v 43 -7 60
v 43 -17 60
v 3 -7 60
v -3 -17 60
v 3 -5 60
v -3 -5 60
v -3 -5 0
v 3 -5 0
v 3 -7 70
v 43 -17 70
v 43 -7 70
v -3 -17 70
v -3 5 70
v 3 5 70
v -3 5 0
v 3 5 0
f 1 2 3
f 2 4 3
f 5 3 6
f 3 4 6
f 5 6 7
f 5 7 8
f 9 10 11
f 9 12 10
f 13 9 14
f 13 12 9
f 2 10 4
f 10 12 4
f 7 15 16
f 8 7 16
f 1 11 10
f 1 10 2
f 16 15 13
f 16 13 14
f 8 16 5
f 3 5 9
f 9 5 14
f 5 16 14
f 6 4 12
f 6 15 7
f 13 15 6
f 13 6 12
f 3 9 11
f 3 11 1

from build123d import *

# Parameters (mm, degrees)
SKETCH1_W           = 6
SKETCH1_H           = 10
BOSS_EXTRUDE1_DEPTH = 70
SKETCH2_W           = 6
SKETCH2_H           = 10
BOSS_EXTRUDE2_DEPTH = 12
SKETCH3_W           = 10
SKETCH3_H           = 10
BOSS_EXTRUDE3_DEPTH = 40


with BuildPart() as part:
    # Sketch1 → Boss-Extrude1 (new body)
    with BuildSketch(Plane.XY):
        Rectangle(SKETCH1_W, SKETCH1_H)
    extrude(amount=BOSS_EXTRUDE1_DEPTH)

    # Sketch2 → Boss-Extrude2 (add)
    with BuildSketch(Plane.XZ.offset(5)):
        with Locations((0, 65)):
            Rectangle(SKETCH2_W, SKETCH2_H)
    extrude(amount=BOSS_EXTRUDE2_DEPTH)

    # Sketch3 → Boss-Extrude3 (add)
    with BuildSketch(Plane(origin=(3, 0, 0), x_dir=(0, 0, -1), z_dir=(1, 0, 0))):
        with Locations((-65, -12)):
            Rectangle(SKETCH3_W, SKETCH3_H)
    extrude(amount=BOSS_EXTRUDE3_DEPTH)


solid = part.part
